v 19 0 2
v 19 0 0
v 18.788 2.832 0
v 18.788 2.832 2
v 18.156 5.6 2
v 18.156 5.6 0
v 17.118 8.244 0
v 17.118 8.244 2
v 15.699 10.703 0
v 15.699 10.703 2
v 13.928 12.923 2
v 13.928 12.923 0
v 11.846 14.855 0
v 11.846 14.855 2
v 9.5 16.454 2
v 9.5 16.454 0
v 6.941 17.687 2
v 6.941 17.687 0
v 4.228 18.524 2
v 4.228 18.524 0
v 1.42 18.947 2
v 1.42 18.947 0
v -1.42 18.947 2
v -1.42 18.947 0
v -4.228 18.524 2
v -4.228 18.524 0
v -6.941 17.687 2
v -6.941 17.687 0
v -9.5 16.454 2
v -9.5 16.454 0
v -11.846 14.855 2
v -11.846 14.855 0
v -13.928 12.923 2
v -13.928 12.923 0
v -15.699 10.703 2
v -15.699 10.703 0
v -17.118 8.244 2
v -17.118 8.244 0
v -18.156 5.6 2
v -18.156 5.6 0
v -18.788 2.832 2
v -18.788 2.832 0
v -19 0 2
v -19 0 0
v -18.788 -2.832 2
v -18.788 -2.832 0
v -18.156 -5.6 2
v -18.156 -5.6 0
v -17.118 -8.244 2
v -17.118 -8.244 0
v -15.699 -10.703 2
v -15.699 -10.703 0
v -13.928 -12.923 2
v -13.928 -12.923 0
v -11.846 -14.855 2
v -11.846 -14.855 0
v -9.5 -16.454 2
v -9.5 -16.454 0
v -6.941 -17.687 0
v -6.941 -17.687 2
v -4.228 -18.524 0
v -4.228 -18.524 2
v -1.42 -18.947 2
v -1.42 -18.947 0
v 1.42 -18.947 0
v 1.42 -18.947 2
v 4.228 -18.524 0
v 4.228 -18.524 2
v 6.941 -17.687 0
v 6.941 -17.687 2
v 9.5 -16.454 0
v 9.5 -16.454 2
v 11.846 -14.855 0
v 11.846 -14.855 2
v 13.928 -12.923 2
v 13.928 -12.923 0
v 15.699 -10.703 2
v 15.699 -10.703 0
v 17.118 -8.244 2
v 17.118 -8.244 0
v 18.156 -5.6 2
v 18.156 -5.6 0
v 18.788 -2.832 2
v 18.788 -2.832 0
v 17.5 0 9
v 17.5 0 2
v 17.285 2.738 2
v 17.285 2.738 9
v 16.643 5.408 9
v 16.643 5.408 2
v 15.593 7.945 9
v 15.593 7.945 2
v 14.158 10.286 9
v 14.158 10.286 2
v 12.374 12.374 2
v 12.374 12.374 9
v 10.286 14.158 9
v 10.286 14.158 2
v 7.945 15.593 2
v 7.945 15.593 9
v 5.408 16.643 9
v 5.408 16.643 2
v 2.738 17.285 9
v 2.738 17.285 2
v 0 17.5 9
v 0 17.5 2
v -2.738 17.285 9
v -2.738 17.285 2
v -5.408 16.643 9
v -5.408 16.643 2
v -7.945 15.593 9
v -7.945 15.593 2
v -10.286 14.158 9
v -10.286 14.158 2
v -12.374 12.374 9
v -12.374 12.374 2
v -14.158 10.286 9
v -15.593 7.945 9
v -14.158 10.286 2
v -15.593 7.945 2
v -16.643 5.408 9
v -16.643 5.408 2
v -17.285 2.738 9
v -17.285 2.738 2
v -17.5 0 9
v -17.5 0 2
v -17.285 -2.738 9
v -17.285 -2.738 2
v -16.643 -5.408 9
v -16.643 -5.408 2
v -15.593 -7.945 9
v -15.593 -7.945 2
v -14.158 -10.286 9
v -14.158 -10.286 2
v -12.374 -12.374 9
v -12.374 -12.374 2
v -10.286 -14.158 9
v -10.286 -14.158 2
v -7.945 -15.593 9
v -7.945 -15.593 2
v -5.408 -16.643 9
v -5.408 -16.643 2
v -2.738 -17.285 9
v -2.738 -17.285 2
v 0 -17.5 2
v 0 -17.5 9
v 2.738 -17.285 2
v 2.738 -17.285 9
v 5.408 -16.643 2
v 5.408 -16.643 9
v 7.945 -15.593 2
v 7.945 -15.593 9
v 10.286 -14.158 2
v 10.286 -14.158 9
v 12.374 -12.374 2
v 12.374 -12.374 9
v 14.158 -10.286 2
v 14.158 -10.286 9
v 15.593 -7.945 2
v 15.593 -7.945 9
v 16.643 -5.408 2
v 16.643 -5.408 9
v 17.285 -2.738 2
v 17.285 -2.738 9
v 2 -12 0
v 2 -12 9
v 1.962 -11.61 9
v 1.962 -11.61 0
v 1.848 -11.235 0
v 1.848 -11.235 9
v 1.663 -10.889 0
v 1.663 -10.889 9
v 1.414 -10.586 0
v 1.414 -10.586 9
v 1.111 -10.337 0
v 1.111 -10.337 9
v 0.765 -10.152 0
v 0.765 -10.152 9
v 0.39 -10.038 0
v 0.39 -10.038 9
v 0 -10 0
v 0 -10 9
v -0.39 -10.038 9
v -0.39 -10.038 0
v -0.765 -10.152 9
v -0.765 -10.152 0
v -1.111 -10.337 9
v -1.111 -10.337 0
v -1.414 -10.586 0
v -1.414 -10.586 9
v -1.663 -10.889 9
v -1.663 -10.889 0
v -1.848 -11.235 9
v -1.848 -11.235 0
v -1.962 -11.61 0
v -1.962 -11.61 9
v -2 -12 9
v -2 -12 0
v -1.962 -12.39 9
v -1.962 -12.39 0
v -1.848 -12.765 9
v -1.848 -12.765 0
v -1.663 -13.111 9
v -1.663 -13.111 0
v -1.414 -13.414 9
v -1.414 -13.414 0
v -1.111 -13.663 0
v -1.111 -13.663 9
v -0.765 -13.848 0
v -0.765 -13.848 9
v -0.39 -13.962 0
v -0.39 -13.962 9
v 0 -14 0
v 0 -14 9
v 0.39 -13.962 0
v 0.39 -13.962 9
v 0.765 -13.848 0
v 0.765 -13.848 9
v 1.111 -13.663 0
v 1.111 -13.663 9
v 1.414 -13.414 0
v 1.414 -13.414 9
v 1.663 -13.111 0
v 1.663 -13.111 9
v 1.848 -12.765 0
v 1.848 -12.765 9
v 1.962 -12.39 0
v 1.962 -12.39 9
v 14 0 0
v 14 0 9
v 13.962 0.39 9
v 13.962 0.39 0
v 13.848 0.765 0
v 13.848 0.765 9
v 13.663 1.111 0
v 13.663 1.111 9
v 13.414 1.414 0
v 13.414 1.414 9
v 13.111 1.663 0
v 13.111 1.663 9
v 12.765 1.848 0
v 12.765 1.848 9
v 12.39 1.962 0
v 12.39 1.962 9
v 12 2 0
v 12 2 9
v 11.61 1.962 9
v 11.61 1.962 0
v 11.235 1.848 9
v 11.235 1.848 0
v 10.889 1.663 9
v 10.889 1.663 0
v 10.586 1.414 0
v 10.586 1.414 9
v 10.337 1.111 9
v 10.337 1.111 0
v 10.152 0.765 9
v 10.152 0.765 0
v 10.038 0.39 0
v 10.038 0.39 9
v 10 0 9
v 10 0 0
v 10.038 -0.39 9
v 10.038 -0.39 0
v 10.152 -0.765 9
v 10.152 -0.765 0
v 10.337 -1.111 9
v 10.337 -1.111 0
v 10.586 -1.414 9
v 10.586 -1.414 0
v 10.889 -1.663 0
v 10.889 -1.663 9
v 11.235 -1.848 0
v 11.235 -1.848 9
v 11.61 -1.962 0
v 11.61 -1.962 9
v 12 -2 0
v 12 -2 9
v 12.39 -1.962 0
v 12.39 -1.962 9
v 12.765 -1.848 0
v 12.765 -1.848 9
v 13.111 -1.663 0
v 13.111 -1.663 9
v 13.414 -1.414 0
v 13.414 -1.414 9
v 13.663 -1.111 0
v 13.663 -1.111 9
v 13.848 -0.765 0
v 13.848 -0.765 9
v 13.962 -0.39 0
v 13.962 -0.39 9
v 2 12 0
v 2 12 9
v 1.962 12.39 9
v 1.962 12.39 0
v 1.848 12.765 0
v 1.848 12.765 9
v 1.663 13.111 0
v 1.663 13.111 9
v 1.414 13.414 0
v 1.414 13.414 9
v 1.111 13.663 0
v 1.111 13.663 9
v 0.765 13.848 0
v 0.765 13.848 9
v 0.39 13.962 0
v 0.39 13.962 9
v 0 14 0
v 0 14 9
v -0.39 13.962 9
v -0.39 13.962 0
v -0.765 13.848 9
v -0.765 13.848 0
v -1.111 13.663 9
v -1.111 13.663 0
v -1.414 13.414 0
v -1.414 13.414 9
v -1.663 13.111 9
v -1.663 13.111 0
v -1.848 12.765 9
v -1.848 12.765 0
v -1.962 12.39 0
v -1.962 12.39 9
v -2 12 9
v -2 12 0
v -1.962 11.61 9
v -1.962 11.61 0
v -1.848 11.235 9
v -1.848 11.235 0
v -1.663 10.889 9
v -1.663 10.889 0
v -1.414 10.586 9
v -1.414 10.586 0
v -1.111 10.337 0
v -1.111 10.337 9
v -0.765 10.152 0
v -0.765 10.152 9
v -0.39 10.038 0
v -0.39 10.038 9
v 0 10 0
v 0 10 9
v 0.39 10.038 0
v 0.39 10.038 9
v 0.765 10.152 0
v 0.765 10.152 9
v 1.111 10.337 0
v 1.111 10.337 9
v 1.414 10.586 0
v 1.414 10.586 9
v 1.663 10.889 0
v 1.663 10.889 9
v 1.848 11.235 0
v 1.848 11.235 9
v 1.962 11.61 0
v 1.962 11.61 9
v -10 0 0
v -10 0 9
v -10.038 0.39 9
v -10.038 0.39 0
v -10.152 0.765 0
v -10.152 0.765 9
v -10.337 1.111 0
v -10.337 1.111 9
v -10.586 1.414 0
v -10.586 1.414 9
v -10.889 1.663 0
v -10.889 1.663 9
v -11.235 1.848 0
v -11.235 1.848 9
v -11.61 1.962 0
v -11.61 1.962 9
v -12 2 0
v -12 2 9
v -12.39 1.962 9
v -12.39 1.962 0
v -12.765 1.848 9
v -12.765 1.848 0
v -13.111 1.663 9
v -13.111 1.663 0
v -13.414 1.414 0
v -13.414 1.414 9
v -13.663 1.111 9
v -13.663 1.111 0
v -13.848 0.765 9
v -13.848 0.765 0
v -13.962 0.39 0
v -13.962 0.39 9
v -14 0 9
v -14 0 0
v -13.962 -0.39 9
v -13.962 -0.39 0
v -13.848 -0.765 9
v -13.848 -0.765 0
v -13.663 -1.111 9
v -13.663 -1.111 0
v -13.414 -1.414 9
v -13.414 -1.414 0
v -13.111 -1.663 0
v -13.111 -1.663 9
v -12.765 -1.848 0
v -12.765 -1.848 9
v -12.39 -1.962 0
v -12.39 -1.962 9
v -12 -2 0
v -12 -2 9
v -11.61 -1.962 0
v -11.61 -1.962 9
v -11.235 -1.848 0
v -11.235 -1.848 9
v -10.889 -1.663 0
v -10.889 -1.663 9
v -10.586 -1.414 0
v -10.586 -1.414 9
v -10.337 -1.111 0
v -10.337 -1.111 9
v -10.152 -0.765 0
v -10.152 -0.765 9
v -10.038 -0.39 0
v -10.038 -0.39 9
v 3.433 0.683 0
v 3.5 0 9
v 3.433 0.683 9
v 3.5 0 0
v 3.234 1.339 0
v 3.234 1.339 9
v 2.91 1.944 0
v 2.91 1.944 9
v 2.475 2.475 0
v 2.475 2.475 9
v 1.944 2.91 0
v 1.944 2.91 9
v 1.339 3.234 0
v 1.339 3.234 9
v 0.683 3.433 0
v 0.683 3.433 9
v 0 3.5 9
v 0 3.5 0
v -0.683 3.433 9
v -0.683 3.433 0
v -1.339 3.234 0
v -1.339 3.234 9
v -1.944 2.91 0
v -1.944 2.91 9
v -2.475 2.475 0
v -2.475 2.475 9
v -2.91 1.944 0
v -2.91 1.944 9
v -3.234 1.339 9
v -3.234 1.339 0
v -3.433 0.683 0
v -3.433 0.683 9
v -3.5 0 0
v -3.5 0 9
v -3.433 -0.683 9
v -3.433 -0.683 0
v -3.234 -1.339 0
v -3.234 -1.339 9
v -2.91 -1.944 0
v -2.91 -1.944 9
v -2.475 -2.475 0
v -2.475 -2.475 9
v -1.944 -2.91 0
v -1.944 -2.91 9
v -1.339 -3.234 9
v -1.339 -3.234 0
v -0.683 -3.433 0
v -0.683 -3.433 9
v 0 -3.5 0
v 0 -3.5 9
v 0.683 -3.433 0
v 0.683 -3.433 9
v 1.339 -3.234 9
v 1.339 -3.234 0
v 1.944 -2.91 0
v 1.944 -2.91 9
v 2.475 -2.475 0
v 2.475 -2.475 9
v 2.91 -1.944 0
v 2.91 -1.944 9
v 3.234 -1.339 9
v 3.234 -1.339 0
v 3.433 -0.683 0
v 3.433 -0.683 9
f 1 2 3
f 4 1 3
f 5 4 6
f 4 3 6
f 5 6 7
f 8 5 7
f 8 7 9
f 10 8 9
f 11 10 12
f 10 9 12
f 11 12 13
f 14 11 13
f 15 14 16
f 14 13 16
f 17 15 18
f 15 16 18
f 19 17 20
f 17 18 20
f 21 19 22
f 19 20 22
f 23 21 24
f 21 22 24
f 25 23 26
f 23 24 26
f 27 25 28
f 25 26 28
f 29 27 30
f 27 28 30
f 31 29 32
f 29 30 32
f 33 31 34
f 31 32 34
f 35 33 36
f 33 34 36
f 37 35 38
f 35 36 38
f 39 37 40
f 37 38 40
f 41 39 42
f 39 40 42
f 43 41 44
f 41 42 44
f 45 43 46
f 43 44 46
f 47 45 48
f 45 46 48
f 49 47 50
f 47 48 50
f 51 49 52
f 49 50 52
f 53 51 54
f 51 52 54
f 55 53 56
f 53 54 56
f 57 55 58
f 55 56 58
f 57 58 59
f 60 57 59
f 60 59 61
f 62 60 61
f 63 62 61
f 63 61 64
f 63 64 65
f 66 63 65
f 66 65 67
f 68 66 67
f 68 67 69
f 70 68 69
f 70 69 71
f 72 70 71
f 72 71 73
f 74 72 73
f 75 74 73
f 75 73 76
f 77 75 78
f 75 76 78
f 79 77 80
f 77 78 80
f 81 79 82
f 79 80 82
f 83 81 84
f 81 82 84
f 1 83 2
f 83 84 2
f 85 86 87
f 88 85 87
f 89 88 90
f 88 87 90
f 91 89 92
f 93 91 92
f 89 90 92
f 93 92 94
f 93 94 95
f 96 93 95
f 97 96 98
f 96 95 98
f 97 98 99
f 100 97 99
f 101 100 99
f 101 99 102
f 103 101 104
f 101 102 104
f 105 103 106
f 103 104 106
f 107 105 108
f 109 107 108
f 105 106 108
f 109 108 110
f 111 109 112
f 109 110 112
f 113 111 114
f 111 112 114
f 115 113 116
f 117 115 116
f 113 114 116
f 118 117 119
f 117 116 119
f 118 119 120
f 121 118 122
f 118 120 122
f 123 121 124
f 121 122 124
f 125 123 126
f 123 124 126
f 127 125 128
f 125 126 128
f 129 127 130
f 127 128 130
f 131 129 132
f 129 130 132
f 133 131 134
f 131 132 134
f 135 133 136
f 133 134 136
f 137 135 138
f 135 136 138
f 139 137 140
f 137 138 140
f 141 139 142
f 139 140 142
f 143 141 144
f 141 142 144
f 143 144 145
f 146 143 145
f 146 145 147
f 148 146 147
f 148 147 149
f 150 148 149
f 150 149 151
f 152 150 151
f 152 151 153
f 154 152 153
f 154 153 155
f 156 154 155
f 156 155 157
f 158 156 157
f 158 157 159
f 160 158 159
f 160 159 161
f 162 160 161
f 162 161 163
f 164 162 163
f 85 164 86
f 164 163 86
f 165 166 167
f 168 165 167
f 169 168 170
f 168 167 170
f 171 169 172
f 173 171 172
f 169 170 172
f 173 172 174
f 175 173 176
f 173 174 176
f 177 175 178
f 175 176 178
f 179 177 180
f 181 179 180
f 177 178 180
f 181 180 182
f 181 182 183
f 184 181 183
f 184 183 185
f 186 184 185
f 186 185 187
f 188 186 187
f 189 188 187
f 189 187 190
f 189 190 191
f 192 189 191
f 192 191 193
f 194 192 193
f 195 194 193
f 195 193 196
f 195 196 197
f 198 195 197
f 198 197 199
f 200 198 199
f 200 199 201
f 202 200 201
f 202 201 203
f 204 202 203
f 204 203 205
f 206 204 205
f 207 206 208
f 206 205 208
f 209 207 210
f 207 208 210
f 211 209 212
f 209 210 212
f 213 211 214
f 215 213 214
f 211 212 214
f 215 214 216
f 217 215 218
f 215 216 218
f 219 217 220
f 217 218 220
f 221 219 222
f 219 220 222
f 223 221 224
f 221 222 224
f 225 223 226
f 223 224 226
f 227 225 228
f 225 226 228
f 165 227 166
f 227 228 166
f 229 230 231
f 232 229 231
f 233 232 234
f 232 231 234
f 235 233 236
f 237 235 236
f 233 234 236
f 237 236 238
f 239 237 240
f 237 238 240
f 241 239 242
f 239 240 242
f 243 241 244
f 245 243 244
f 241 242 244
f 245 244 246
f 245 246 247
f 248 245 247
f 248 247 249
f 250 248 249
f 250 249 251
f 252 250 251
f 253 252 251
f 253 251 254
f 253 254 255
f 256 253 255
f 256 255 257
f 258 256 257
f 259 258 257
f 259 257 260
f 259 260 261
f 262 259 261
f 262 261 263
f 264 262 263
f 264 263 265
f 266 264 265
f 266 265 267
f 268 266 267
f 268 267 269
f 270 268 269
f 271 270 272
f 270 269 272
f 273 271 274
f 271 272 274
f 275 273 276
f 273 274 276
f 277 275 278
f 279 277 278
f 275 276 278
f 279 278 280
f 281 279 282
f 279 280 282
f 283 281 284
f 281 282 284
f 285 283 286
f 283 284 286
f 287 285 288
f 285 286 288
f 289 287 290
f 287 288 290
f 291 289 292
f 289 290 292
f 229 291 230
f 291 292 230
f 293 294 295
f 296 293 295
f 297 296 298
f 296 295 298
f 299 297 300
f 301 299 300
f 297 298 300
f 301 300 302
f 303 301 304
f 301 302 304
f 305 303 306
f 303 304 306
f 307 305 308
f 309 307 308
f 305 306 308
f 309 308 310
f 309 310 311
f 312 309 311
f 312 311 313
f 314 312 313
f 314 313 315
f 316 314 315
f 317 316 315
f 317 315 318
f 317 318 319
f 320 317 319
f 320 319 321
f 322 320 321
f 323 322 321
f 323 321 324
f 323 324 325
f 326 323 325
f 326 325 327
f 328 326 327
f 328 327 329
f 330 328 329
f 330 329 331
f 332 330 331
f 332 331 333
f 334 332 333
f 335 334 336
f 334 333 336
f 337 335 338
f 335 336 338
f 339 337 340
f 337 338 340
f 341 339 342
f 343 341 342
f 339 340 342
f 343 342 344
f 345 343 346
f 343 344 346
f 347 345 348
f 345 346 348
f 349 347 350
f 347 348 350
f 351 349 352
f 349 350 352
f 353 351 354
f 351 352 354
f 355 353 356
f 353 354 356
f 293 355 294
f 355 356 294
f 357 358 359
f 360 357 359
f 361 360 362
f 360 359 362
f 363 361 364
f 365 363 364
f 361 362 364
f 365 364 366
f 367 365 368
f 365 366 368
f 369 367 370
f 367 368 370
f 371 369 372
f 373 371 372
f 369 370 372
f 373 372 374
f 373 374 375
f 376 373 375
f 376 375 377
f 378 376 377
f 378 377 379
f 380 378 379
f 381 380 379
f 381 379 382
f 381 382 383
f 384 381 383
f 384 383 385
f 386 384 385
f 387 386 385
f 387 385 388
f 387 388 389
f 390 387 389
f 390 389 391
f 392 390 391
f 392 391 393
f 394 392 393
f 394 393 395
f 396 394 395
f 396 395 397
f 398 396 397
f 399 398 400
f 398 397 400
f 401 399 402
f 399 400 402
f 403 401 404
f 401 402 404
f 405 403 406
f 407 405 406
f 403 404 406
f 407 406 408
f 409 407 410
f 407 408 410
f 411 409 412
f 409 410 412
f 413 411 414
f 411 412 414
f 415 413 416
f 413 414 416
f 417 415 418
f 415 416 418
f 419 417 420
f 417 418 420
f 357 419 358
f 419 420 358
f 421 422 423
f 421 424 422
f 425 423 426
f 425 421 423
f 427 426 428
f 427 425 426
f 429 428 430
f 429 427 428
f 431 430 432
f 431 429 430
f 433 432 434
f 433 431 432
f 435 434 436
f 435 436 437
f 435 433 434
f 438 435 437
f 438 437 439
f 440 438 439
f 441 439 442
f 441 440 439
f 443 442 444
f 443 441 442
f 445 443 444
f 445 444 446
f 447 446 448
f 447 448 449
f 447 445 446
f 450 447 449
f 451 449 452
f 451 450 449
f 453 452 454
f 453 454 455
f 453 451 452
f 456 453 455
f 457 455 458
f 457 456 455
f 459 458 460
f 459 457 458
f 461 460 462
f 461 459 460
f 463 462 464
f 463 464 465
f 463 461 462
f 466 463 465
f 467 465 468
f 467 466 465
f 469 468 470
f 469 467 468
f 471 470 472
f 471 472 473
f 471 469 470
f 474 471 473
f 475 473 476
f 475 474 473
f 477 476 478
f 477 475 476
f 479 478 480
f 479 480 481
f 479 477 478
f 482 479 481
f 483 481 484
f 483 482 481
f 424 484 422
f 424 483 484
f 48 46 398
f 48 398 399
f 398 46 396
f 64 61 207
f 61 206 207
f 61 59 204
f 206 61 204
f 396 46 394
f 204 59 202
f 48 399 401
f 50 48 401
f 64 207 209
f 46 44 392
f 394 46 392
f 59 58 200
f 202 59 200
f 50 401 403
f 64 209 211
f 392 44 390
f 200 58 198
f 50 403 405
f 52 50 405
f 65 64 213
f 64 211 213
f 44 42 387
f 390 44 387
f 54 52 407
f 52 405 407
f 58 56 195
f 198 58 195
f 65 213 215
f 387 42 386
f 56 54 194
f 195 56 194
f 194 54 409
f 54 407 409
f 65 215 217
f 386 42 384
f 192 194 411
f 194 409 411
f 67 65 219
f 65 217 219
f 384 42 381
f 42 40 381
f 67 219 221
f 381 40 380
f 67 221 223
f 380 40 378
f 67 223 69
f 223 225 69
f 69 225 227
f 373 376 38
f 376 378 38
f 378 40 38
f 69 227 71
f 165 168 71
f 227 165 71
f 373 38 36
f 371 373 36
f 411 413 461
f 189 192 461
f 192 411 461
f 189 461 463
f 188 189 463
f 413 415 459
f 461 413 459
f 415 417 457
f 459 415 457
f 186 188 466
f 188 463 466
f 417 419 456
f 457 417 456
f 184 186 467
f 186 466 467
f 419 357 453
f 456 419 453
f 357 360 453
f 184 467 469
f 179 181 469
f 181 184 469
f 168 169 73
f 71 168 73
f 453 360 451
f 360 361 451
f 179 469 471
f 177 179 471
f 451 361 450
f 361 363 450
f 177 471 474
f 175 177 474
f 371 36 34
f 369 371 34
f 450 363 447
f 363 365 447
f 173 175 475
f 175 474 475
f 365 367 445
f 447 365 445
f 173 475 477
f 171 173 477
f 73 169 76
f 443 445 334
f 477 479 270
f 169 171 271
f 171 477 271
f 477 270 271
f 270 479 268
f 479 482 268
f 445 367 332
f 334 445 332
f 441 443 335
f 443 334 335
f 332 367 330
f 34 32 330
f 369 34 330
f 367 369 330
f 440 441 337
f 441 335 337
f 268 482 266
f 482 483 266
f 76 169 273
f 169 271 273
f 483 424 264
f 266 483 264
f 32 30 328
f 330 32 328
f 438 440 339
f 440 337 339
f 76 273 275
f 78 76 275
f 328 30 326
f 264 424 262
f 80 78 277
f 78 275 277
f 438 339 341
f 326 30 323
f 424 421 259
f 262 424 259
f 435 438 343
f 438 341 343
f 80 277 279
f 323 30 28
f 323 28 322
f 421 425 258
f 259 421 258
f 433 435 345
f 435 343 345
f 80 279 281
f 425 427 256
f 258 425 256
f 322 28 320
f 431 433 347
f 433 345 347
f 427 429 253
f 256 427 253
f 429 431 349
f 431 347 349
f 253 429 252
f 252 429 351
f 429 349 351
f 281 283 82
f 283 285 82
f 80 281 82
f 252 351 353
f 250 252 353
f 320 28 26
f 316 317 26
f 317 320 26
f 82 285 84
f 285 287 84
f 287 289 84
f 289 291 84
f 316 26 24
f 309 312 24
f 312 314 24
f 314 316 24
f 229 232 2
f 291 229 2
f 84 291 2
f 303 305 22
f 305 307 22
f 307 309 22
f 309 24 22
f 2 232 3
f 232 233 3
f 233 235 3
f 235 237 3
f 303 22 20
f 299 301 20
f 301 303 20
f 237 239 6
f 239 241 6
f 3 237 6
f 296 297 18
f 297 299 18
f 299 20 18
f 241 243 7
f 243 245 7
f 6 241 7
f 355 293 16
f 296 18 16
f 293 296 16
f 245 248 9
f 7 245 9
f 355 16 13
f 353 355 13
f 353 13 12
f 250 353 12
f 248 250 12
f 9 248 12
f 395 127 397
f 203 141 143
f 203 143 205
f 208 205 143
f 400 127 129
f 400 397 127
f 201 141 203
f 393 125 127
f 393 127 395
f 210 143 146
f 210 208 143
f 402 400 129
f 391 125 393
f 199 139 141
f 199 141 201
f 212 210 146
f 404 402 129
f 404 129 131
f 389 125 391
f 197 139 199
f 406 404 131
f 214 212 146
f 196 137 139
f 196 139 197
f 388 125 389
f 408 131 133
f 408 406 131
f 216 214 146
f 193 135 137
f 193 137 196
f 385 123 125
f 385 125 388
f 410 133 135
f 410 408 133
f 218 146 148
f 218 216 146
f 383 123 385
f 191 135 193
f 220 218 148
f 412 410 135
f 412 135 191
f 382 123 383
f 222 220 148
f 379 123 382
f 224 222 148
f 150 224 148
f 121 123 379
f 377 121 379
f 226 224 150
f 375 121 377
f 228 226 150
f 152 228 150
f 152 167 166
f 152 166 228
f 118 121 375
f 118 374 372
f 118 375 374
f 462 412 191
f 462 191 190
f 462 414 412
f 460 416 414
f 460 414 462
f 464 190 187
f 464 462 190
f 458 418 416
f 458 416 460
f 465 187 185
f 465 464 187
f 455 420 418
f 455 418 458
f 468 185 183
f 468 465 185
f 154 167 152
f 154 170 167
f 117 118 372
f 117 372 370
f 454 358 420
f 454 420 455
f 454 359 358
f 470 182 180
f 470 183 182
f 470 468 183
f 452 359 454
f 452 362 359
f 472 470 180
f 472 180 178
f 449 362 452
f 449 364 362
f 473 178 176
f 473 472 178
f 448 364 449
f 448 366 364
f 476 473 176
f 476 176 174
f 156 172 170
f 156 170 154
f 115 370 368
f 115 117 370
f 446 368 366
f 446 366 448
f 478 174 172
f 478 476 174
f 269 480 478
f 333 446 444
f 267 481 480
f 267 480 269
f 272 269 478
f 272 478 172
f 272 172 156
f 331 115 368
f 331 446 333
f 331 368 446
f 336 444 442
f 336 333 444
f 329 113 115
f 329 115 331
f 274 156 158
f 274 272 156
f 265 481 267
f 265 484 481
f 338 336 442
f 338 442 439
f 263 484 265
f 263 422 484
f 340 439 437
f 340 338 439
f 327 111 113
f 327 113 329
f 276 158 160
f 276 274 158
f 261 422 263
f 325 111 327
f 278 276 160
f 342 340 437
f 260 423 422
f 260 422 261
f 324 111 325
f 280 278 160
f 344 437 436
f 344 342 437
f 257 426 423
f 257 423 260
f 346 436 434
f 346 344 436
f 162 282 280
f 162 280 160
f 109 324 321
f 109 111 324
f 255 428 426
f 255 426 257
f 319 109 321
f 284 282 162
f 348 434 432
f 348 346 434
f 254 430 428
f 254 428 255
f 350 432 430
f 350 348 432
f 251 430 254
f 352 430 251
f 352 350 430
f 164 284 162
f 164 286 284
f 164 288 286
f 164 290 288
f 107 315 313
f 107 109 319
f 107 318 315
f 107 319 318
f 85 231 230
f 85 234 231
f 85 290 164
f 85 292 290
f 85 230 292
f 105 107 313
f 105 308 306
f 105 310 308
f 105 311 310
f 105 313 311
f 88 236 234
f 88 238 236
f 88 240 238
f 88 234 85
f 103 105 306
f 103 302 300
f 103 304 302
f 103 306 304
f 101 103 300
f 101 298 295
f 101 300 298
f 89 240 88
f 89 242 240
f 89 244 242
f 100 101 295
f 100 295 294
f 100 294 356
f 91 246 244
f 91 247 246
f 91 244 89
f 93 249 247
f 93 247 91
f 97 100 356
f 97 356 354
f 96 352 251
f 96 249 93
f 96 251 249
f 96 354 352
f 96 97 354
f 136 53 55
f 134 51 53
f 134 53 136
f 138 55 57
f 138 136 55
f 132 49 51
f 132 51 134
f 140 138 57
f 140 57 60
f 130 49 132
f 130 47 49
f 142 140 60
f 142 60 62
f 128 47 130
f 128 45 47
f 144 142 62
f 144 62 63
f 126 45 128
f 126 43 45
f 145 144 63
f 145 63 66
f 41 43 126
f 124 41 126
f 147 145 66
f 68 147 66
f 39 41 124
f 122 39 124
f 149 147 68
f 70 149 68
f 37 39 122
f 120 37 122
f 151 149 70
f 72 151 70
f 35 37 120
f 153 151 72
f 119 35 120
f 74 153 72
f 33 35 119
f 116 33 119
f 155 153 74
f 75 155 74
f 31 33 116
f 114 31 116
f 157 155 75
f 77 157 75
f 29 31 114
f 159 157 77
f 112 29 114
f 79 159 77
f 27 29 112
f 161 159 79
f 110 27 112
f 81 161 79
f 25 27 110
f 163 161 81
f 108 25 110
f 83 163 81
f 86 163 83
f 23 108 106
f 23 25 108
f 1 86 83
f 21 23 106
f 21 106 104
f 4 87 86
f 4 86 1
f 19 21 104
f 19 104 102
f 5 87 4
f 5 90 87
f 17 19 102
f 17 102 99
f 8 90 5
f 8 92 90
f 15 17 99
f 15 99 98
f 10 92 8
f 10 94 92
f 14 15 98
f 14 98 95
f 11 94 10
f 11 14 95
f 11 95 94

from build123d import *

# Parameters (mm, degrees)
F0_R     = 19
F0_R_2   = 3.5
F1_DEPTH = 2
F2_R     = 17.5
F2_R_2   = 3.5
F3_DEPTH = 7
F4_R     = 2
F5_DEPTH = 25


with BuildPart() as f1:
    # F0 (on Top) → F1 (new body)
    with BuildSketch(Plane.XY):
        Circle(F0_R)
        Circle(F0_R_2, mode=Mode.SUBTRACT)
    extrude(amount=F1_DEPTH)

    # F2 (on face) → F3 (join)
    with BuildSketch(Plane.XY.offset(2)):
        Circle(F2_R)
        Circle(F2_R_2, mode=Mode.SUBTRACT)
    extrude(amount=F3_DEPTH)

    # F4 (on face) → F5 (cut)
    with BuildSketch(Plane.XY.offset(9)):
        with Locations((0, 12)):
            Circle(F4_R)
        with Locations((-12, 0)):
            Circle(F4_R)
        with Locations((0, -12)):
            Circle(F4_R)
        with Locations((12, 0)):
            Circle(F4_R)
    extrude(amount=-F5_DEPTH, mode=Mode.SUBTRACT)


solid = f1.part
